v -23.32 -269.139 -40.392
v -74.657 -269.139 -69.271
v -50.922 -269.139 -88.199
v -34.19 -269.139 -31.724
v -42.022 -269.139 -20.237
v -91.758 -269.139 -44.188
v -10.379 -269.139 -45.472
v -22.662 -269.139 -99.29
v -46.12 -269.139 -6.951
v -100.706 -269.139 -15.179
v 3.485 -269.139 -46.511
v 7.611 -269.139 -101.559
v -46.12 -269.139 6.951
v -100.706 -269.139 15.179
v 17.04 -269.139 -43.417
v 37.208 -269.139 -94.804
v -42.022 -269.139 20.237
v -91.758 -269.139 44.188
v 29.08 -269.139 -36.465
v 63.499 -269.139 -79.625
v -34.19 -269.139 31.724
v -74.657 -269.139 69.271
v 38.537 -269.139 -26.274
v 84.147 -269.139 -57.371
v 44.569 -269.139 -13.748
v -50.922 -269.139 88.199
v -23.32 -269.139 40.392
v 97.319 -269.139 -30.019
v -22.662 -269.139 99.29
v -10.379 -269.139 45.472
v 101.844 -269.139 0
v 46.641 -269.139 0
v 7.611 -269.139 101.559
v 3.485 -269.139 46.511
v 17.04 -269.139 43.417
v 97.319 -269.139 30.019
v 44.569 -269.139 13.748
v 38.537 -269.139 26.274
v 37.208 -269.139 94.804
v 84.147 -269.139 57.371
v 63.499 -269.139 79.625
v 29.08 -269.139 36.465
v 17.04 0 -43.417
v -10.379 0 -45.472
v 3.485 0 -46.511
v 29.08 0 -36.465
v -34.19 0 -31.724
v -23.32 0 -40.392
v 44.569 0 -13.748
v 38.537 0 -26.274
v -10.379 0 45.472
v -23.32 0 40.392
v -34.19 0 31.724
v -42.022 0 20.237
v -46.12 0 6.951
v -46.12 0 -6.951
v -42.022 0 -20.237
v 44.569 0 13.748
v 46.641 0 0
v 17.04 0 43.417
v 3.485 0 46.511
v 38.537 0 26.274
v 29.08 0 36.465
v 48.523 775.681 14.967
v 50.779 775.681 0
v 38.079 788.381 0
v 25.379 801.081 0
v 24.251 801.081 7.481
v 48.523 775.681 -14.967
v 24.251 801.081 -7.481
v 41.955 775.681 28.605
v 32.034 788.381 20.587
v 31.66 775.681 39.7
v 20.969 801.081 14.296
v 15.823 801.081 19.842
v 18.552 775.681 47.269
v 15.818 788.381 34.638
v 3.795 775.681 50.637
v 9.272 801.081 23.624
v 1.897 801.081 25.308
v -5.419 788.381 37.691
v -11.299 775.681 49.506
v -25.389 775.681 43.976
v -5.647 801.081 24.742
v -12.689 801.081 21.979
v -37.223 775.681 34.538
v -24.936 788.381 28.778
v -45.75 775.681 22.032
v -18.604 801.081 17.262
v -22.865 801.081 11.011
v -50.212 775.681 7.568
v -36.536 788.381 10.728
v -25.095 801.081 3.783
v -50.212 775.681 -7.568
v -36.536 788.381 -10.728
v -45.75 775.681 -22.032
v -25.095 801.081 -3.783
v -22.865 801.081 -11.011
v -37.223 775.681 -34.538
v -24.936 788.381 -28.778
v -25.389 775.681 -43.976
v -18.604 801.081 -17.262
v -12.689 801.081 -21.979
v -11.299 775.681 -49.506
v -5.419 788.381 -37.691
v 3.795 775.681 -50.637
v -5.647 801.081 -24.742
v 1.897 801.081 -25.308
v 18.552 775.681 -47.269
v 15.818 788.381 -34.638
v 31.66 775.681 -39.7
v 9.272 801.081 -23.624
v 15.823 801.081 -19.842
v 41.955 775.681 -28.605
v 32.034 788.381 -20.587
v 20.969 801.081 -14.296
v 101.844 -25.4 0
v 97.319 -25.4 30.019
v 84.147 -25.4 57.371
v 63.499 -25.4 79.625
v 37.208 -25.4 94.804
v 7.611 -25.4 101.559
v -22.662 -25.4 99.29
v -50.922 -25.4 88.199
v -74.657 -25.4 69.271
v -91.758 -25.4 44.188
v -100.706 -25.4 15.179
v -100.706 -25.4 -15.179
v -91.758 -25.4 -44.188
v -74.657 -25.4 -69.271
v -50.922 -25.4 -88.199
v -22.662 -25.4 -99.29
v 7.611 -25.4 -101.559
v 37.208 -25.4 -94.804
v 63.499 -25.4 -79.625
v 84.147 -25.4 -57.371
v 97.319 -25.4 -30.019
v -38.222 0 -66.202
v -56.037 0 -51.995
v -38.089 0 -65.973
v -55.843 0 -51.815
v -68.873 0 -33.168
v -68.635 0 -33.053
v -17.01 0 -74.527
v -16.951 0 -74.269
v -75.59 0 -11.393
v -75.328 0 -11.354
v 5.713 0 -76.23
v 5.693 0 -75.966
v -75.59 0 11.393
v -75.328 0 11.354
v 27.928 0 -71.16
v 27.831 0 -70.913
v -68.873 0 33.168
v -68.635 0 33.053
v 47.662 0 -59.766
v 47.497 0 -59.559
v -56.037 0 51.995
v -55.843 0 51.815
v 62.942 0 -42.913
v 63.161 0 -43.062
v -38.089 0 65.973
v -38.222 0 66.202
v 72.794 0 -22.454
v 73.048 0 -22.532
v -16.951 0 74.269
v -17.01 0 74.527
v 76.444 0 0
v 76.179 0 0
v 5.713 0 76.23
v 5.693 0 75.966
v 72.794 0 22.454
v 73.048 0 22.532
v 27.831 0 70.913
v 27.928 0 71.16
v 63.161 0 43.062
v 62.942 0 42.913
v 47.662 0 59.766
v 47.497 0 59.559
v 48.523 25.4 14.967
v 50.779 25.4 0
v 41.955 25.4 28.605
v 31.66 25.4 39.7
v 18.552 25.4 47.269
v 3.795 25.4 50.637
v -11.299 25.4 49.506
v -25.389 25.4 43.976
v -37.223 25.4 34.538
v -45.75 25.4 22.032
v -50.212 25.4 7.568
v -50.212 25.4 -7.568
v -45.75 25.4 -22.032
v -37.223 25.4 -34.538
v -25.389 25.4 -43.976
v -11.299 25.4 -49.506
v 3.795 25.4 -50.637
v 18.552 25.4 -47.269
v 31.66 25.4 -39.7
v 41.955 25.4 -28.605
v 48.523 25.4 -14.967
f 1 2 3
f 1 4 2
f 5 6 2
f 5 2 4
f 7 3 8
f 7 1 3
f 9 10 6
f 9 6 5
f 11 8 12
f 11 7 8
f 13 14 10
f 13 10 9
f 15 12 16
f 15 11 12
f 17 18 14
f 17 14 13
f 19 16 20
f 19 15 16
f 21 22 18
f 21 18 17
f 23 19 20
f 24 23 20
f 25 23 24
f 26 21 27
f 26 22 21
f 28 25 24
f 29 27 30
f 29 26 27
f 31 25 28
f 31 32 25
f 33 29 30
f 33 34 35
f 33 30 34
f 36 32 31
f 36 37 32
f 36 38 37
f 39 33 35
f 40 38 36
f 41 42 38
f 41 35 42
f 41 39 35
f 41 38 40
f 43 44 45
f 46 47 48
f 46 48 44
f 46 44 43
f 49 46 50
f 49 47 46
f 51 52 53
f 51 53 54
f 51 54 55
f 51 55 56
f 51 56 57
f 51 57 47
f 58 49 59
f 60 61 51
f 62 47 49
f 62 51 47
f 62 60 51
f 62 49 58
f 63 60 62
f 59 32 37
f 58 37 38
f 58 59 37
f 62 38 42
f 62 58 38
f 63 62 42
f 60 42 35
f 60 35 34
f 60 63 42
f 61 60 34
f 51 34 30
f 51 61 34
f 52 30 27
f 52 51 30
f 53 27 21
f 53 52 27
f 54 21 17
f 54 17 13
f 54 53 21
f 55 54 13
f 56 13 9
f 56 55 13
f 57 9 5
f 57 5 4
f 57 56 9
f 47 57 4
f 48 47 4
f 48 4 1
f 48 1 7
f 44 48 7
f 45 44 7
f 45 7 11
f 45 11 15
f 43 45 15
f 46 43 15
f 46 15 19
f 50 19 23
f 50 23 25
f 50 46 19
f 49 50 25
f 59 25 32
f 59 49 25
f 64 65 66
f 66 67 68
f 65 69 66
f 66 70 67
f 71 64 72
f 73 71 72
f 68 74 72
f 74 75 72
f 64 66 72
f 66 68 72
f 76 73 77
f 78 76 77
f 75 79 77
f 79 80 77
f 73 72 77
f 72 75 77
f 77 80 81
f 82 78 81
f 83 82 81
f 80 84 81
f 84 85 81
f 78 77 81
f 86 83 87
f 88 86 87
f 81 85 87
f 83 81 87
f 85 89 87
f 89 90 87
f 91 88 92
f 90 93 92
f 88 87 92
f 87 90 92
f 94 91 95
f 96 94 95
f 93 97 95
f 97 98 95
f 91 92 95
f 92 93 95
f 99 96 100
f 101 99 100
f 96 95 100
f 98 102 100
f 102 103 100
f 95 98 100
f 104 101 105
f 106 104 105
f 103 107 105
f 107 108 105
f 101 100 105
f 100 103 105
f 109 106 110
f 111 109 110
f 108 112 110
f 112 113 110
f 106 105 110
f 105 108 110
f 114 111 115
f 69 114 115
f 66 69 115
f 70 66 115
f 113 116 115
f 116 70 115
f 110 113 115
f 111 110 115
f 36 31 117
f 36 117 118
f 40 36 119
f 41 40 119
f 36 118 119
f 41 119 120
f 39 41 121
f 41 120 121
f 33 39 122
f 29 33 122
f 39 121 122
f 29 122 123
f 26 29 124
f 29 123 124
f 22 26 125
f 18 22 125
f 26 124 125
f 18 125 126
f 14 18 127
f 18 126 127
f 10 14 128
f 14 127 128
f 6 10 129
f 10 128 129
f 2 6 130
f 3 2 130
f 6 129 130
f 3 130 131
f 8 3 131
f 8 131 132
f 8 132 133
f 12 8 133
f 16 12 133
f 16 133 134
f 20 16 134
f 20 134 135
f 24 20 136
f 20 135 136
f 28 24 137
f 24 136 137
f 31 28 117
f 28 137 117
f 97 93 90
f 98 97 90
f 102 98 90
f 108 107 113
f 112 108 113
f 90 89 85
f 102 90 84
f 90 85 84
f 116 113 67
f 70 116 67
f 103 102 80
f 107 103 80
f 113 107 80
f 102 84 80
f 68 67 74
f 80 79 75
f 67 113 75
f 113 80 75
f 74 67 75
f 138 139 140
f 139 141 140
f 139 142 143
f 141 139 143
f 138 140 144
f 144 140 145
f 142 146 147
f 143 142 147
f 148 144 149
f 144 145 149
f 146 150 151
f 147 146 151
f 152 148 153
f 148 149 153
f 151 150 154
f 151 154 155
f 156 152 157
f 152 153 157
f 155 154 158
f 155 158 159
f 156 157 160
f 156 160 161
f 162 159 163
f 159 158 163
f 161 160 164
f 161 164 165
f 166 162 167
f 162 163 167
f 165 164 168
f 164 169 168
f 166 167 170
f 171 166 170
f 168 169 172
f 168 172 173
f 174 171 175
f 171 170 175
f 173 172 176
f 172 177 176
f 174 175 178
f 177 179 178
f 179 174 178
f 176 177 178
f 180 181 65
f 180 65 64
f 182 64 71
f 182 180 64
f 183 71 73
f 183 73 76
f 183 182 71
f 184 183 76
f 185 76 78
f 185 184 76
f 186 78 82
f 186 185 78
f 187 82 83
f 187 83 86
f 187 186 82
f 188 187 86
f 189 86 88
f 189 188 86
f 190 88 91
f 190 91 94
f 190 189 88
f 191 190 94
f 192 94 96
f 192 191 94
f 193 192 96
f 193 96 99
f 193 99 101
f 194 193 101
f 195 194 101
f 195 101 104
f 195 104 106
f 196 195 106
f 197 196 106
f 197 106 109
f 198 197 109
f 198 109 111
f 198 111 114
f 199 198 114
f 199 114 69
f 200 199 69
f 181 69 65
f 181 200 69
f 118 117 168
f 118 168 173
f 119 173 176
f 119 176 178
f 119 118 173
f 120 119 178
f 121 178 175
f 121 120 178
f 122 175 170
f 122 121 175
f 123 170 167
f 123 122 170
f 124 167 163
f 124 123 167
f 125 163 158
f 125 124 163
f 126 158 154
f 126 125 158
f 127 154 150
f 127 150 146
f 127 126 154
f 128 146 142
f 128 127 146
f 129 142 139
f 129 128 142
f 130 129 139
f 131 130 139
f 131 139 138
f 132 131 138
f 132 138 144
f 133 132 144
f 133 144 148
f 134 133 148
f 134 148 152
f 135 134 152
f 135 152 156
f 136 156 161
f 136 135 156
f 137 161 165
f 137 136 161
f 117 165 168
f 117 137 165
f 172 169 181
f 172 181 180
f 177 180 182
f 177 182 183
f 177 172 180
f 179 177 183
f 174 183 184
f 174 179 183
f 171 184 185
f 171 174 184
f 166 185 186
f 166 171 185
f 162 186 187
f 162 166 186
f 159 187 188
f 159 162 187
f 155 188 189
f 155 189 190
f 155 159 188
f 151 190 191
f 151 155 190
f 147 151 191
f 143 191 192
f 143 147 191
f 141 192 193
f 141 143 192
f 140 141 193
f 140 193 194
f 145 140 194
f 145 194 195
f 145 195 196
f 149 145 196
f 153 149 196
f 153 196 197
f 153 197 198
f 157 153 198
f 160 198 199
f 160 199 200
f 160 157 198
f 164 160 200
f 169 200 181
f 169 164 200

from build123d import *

# Parameters (mm, degrees)
F0_R     = 101.843803
F0_R_2   = 46.640997
F1_DEPTH = 269.139469
F2_R     = 50.778729
F3_DEPTH = 801.080585
F4_SIZE  = 25.4


with BuildPart() as f1:
    # F0 (on Front) → F1 (new body)
    with BuildSketch(Plane.XZ):
        Circle(F0_R)
        Circle(F0_R_2, mode=Mode.SUBTRACT)
    extrude(amount=F1_DEPTH)

    # F2 (on Front) → F3 (join)
    with BuildSketch(Plane.XZ):
        Circle(F2_R)
    extrude(amount=-F3_DEPTH)

    # F4
    f4_edges = [f1.edges().sort_by_distance(p)[0] for p in [
        (50.778729, 400.540292, 0),
        (-50.778729, 0, 0),
        (-50.778729, 801.080585, 0),
        (-101.843803, 0, 0),
    ]]
    chamfer(f4_edges, length=F4_SIZE)


solid = f1.part
